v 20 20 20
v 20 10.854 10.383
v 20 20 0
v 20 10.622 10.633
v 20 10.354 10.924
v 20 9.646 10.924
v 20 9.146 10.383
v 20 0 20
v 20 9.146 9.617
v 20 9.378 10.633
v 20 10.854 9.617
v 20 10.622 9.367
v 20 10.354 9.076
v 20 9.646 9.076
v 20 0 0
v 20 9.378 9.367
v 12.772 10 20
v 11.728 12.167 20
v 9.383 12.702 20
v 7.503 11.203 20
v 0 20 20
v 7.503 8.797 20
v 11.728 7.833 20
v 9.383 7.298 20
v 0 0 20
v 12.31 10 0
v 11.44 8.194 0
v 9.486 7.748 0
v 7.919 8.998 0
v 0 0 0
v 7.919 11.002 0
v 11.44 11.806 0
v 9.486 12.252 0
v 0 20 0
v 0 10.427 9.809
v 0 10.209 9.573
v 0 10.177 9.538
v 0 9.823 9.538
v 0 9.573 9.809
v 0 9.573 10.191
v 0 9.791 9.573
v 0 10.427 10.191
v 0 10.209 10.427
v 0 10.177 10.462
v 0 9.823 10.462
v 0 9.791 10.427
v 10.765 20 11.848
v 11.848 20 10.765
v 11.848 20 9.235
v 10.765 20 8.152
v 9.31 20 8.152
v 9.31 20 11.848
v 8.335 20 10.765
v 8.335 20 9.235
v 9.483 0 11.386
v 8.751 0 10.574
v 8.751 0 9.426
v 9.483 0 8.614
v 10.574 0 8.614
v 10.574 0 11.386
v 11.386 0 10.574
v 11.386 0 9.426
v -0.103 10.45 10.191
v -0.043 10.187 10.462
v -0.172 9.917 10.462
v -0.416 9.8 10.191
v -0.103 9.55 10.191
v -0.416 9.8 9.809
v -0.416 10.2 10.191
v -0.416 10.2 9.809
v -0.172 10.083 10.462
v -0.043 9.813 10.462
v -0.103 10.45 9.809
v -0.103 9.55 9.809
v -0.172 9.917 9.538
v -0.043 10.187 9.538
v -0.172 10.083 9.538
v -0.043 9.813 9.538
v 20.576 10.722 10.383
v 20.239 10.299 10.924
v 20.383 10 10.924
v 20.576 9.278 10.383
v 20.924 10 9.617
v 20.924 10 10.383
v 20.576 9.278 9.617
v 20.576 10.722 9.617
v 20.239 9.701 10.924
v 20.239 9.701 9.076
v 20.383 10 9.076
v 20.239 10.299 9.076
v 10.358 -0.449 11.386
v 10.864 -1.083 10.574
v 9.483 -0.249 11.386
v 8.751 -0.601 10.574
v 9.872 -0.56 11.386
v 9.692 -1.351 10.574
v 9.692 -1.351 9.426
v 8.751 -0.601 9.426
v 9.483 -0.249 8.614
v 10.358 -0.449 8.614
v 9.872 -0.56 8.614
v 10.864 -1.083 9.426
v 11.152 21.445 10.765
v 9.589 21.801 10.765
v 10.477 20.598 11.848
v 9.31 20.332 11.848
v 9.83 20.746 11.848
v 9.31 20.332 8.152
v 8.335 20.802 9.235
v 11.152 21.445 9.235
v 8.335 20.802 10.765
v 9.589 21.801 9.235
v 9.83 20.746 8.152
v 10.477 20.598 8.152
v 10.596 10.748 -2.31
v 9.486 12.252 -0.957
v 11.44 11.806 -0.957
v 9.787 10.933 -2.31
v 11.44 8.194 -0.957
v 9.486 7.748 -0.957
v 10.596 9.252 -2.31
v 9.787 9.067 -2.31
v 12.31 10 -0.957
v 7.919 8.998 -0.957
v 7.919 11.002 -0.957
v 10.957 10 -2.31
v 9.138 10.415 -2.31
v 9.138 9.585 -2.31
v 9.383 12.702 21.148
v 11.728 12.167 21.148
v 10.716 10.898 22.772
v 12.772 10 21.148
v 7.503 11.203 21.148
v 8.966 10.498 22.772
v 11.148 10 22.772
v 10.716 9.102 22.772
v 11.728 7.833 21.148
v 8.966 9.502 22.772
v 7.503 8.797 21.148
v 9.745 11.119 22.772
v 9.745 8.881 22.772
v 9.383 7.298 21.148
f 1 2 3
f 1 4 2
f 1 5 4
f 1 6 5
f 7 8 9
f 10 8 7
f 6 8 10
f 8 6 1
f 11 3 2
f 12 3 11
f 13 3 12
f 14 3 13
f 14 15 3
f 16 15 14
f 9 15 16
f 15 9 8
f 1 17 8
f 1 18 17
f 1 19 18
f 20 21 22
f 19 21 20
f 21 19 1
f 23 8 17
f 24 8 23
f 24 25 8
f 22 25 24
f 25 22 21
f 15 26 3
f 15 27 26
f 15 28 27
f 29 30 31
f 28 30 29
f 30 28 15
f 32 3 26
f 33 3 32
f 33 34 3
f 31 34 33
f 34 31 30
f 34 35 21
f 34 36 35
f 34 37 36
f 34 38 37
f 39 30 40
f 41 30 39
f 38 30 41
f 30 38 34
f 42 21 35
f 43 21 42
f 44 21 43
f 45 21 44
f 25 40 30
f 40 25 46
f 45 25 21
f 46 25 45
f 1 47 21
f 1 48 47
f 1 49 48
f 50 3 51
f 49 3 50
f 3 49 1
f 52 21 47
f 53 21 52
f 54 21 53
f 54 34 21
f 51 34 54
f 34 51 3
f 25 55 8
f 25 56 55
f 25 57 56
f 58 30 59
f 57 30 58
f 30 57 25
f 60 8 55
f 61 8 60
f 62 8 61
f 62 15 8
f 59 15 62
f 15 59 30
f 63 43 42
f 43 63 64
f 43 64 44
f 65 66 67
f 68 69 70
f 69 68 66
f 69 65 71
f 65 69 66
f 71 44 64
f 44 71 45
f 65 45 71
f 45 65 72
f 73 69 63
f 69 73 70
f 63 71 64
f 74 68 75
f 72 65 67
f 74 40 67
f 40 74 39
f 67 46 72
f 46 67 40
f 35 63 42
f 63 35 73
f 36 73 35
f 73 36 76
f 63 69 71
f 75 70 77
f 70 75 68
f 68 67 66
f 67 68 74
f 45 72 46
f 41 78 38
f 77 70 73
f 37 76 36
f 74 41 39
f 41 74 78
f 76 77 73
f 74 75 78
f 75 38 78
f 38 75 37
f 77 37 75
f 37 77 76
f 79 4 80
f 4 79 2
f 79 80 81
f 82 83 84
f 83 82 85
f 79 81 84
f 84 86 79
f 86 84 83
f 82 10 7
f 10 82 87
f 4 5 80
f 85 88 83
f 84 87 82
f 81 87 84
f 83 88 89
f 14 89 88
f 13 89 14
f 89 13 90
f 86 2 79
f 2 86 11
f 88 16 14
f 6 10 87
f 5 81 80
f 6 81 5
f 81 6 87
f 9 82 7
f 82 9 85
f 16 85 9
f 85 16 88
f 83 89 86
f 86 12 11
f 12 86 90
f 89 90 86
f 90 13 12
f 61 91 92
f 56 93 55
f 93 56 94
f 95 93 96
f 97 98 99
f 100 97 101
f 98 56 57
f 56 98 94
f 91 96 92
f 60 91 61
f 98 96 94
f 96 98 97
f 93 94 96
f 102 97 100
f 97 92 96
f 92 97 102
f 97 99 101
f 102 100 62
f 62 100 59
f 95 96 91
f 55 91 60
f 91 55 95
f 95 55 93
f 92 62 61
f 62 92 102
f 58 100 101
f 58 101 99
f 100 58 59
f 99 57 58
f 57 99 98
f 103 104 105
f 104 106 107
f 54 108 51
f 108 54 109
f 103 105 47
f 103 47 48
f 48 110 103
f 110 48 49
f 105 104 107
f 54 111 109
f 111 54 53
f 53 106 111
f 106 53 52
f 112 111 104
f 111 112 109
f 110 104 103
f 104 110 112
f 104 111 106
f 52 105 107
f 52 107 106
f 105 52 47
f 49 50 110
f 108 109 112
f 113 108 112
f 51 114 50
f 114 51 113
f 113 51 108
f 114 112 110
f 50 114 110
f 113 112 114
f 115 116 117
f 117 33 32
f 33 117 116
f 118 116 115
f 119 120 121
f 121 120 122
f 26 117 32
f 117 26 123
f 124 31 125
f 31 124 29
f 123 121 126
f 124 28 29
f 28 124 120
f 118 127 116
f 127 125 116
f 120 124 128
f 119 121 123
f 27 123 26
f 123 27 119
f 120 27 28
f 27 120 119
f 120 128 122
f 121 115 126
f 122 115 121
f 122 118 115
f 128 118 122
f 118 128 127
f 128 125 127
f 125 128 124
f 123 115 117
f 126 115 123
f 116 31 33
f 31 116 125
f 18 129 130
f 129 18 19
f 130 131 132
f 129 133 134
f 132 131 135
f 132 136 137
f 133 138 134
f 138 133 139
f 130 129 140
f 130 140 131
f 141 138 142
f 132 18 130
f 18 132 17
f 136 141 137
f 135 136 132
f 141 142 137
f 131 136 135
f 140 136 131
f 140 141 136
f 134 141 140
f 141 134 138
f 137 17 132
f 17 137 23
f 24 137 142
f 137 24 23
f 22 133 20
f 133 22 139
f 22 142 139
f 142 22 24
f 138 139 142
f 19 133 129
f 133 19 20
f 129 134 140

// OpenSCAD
$fn=7;
union()
{
	translate([0,0,0])
	{
		rotate(0,[0,0,1])
		{
			cube([20,20,20]);
		}
	}
	translate([0,10,10])
	{
		rotate(0,[0,0,1])
		{
			sphere(d=1);
		}
	}
	translate([20,10,10])
	{
		rotate(0,[0,0,1])
		{
			sphere(d=2);
		}
	}
	translate([10,0,10])
	{
		rotate(0,[0,0,1])
		{
			sphere(d=3);
		}
	}
	translate([10,20,10])
	{
		rotate(0,[0,0,1])
		{
			sphere(d=4);
		}
	}
	translate([10,10,0])
	{
		rotate(0,[0,0,1])
		{
			sphere(d=5);
		}
	}
	translate([10,10,20])
	{
		rotate(0,[0,0,1])
		{
			sphere(d=6);
		}
	}
}
